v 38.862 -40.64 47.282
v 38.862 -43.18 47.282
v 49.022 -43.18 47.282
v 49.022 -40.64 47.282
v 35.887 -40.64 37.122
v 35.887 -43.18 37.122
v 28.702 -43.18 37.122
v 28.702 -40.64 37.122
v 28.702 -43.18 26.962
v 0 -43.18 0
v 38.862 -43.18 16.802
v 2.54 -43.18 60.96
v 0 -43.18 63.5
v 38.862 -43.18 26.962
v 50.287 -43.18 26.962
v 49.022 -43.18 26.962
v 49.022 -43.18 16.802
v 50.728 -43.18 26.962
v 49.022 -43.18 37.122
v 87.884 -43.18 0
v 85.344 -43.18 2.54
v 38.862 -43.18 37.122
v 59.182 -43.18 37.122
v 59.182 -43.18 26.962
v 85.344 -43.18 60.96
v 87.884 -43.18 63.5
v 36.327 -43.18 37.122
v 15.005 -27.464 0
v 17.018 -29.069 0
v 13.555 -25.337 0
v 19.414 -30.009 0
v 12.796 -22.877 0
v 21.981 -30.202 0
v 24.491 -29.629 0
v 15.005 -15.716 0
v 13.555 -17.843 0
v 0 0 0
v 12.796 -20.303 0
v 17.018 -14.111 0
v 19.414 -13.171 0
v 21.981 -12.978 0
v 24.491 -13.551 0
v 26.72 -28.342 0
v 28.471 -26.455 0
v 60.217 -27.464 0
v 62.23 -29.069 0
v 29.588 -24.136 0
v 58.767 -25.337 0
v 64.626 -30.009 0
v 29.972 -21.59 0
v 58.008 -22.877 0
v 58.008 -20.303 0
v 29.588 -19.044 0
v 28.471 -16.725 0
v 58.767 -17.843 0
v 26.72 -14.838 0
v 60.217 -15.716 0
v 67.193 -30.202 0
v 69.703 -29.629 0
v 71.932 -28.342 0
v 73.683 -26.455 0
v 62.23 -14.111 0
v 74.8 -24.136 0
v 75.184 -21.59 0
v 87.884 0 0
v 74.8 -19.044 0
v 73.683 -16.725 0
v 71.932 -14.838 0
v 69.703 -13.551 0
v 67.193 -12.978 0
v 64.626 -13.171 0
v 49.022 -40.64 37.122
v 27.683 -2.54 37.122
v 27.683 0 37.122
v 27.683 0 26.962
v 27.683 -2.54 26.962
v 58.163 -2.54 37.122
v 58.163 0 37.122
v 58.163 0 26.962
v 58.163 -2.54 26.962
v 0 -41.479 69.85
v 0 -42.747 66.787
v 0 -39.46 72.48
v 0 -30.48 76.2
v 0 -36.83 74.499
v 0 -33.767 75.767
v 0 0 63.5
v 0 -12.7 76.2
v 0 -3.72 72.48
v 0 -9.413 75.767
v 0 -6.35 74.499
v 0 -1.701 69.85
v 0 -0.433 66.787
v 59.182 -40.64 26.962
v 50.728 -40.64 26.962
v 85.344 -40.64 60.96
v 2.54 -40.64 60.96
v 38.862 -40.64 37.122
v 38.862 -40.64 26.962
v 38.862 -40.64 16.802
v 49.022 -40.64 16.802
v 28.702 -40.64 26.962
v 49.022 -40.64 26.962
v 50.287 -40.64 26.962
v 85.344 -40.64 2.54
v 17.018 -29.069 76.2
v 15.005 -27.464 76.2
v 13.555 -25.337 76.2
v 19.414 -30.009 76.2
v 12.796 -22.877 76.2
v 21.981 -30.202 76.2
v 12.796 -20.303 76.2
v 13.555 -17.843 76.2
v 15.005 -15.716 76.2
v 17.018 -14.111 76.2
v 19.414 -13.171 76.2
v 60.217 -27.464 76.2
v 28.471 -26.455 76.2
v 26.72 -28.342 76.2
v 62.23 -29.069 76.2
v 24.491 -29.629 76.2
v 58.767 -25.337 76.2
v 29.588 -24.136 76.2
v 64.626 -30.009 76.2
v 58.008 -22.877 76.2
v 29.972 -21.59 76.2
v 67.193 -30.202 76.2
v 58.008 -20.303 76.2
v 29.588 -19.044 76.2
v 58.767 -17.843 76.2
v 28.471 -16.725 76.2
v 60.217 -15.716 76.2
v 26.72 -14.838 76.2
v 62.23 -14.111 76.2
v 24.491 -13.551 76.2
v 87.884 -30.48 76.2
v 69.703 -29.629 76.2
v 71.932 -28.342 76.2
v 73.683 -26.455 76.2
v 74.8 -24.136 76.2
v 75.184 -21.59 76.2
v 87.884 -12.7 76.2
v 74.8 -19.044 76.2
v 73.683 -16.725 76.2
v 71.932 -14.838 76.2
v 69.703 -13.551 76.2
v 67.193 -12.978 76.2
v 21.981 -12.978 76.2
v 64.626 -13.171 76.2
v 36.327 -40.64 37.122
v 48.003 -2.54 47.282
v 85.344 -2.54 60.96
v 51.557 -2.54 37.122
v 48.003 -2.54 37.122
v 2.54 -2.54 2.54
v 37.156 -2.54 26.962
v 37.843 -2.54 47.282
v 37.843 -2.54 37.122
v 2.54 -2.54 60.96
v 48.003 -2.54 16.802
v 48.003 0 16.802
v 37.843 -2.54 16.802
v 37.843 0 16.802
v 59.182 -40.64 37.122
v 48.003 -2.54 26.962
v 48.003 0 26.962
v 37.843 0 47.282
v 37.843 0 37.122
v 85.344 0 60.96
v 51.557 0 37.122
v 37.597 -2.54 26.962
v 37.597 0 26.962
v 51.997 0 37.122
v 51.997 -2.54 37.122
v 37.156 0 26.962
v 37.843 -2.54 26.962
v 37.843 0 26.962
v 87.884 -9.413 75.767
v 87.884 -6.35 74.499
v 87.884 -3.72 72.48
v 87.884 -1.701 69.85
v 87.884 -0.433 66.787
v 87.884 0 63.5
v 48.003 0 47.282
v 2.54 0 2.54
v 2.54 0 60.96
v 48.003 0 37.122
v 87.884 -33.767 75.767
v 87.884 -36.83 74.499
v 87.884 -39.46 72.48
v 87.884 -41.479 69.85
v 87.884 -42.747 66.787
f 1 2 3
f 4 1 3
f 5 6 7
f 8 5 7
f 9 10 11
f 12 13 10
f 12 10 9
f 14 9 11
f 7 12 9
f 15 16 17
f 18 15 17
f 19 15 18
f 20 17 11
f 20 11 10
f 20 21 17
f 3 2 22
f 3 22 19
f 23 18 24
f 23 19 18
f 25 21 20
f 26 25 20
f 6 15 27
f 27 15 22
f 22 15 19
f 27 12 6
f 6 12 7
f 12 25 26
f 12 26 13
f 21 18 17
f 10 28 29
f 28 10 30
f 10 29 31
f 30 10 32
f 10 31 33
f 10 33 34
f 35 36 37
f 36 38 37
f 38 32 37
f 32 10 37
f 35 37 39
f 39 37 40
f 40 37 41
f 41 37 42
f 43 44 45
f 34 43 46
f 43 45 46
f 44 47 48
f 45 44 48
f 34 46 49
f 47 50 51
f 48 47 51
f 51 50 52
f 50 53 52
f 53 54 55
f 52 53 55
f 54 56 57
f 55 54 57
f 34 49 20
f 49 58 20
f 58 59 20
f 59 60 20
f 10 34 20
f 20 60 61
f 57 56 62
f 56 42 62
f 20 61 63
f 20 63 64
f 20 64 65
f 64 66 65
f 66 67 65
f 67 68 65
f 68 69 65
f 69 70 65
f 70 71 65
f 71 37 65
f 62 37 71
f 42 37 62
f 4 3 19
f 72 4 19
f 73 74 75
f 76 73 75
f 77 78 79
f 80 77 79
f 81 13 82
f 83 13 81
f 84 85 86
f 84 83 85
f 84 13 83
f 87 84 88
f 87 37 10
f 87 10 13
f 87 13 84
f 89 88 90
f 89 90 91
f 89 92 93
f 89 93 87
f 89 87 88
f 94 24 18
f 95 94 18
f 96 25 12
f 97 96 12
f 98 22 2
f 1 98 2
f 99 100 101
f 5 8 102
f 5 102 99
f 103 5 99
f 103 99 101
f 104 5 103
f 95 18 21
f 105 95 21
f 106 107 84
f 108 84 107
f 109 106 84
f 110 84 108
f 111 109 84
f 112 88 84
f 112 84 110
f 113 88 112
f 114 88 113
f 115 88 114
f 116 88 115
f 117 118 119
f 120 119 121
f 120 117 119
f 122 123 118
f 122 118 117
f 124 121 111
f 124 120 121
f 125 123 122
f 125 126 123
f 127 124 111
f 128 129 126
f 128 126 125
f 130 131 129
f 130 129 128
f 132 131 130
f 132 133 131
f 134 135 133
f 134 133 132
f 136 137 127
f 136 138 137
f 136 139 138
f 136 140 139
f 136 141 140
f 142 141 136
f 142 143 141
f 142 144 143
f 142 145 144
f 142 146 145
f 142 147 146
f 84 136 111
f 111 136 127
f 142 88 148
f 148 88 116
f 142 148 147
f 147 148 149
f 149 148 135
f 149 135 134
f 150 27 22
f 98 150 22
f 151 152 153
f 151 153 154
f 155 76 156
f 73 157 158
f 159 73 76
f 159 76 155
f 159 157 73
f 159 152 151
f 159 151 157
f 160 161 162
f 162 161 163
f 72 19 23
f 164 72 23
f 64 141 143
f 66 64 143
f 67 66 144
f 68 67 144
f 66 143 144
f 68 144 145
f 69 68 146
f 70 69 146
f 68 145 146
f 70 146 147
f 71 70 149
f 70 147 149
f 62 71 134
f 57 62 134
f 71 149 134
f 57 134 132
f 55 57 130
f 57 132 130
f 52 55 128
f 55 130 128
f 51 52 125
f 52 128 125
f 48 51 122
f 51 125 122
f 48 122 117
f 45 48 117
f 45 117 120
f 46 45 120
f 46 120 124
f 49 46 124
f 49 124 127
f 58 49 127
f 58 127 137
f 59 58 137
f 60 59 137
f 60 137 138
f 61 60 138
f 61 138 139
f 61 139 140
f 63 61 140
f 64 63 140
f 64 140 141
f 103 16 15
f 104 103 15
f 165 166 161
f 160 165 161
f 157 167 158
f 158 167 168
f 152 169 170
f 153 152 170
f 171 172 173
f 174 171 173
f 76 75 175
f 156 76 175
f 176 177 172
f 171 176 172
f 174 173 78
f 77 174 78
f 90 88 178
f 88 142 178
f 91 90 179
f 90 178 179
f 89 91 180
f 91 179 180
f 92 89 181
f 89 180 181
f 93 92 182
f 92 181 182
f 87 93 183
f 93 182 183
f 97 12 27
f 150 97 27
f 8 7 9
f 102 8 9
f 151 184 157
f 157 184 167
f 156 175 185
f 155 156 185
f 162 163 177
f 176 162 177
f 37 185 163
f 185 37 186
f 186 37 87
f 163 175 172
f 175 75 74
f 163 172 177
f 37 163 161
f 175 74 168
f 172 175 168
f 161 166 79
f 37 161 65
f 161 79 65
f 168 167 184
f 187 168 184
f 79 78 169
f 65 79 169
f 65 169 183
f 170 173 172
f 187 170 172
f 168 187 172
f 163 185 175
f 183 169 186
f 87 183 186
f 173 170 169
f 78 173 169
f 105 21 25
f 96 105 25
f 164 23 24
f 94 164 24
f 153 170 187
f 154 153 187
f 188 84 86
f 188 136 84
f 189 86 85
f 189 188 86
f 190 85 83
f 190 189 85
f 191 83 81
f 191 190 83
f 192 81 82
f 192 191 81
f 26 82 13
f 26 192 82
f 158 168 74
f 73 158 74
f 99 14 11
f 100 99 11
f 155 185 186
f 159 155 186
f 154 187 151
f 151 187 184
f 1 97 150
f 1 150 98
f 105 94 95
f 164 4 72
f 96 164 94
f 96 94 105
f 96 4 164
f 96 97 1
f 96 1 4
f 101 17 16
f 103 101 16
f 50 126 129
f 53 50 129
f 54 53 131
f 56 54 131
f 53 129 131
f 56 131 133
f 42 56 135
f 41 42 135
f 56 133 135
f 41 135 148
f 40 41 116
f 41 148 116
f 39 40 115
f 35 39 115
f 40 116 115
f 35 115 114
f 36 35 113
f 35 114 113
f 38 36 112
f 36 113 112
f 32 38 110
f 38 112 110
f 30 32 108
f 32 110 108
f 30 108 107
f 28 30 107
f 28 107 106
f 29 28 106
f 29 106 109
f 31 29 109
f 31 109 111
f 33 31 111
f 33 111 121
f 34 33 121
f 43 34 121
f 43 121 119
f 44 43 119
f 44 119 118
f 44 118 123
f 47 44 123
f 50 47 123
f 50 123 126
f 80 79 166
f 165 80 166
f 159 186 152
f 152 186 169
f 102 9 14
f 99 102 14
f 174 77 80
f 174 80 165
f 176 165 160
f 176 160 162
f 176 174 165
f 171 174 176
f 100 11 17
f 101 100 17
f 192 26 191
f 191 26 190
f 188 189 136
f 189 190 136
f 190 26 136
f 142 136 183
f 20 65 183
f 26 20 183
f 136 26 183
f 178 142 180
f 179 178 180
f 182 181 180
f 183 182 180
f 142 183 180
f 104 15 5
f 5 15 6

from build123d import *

# Parameters (mm, degrees)
F0_W     = 87.884
F0_H     = 76.2
F1_DEPTH = 43.18
F2_R     = 12.7
F4_DEPTH = 2.54
F5_DEPTH = 2.54
F7_DEPTH = 2.54
F8_R     = 8.636
F9_DEPTH = 76.201


# Not quite as in the source:
# - ends of sketch curves that miss each other by under 0.0002 mm in the source are joined


with BuildPart() as f1:
    # F0 (on Front) → F1 (new body)
    with BuildSketch(Plane.XZ):
        with Locations((43.942, 38.1)):
            Rectangle(F0_W, F0_H)
    extrude(amount=F1_DEPTH)

    # F2
    f2_edges = [f1.edges().sort_by_distance(p)[0] for p in [
        (43.942, -43.18, 76.2),
        (43.942, 0, 76.2),
    ]]
    fillet(f2_edges, radius=F2_R)

    # F3 (on face) → F4 (cut)
    with BuildSketch(Plane.XZ.offset(43.18)):
        Polygon((38.862, 47.2823401565), (43.942, 47.2823401565), (49.022, 47.2823401565), (49.022, 37.1223401565), (59.182, 37.1223401565), (59.182, 26.9623401565), (50.7279873173, 26.9623401565), (85.3440016508, 2.5399983492), (85.3440016508, 60.9600016508), (2.5399983492, 60.9600016508), (36.3272919048, 37.1223401565), (38.862, 37.1223401565), align=None)
    extrude(amount=-F4_DEPTH, mode=Mode.SUBTRACT)

    # F3 (on face) → F5 (cut)
    with BuildSketch(Plane.XZ.offset(43.18)):
        Polygon((50.2873871384, 26.9623401565), (35.8866917258, 37.1223401565), (28.702, 37.1223401565), (28.702, 26.9623401565), (38.862, 26.9623401565), (38.862, 16.8023401565), (43.942, 16.8023401565), (49.022, 16.8023401565), (49.022, 26.9623401565), align=None)
    extrude(amount=-F5_DEPTH, mode=Mode.SUBTRACT)

    # F6 (on face) → F7 (cut)
    with BuildSketch(Plane(origin=(0, 0, 0), x_dir=(-1, 0, 0), z_dir=(0, 1, 0))):
        Polygon((-48.0027233214, 47.2823394346), (-42.9227233214, 47.2823394346), (-37.8427233214, 47.2823394346), (-37.8427233214, 37.1223394346), (-27.6827233214, 37.1223394346), (-27.6827233214, 26.9623394346), (-37.1560138865, 26.9623391642), (-2.54, 2.5399966984), (-2.54, 60.96), (-85.344, 60.96), (-51.5567091082, 37.1223394346), (-48.0027233214, 37.1223394346), align=None)
        Polygon((-37.5966140538, 26.9623391642), (-51.9973092754, 37.1223394346), (-58.1627233214, 37.1223394346), (-58.1627233214, 26.9623394346), (-48.0027233214, 26.9623394346), (-48.0027233214, 16.8023394346), (-42.9227233214, 16.8023394346), (-37.8427233214, 16.8023394346), (-37.8427233214, 26.9623394346), align=None)
    extrude(amount=-F7_DEPTH, mode=Mode.SUBTRACT)

    # F8 (on face) → F9 (cut, through all)
    with BuildSketch(Plane.XY.offset(76.2)):
        with Locations((21.336, -21.59)):
            Circle(F8_R)
        with Locations((66.548, -21.59)):
            Circle(F8_R)
    extrude(amount=-F9_DEPTH, mode=Mode.SUBTRACT)


solid = f1.part
